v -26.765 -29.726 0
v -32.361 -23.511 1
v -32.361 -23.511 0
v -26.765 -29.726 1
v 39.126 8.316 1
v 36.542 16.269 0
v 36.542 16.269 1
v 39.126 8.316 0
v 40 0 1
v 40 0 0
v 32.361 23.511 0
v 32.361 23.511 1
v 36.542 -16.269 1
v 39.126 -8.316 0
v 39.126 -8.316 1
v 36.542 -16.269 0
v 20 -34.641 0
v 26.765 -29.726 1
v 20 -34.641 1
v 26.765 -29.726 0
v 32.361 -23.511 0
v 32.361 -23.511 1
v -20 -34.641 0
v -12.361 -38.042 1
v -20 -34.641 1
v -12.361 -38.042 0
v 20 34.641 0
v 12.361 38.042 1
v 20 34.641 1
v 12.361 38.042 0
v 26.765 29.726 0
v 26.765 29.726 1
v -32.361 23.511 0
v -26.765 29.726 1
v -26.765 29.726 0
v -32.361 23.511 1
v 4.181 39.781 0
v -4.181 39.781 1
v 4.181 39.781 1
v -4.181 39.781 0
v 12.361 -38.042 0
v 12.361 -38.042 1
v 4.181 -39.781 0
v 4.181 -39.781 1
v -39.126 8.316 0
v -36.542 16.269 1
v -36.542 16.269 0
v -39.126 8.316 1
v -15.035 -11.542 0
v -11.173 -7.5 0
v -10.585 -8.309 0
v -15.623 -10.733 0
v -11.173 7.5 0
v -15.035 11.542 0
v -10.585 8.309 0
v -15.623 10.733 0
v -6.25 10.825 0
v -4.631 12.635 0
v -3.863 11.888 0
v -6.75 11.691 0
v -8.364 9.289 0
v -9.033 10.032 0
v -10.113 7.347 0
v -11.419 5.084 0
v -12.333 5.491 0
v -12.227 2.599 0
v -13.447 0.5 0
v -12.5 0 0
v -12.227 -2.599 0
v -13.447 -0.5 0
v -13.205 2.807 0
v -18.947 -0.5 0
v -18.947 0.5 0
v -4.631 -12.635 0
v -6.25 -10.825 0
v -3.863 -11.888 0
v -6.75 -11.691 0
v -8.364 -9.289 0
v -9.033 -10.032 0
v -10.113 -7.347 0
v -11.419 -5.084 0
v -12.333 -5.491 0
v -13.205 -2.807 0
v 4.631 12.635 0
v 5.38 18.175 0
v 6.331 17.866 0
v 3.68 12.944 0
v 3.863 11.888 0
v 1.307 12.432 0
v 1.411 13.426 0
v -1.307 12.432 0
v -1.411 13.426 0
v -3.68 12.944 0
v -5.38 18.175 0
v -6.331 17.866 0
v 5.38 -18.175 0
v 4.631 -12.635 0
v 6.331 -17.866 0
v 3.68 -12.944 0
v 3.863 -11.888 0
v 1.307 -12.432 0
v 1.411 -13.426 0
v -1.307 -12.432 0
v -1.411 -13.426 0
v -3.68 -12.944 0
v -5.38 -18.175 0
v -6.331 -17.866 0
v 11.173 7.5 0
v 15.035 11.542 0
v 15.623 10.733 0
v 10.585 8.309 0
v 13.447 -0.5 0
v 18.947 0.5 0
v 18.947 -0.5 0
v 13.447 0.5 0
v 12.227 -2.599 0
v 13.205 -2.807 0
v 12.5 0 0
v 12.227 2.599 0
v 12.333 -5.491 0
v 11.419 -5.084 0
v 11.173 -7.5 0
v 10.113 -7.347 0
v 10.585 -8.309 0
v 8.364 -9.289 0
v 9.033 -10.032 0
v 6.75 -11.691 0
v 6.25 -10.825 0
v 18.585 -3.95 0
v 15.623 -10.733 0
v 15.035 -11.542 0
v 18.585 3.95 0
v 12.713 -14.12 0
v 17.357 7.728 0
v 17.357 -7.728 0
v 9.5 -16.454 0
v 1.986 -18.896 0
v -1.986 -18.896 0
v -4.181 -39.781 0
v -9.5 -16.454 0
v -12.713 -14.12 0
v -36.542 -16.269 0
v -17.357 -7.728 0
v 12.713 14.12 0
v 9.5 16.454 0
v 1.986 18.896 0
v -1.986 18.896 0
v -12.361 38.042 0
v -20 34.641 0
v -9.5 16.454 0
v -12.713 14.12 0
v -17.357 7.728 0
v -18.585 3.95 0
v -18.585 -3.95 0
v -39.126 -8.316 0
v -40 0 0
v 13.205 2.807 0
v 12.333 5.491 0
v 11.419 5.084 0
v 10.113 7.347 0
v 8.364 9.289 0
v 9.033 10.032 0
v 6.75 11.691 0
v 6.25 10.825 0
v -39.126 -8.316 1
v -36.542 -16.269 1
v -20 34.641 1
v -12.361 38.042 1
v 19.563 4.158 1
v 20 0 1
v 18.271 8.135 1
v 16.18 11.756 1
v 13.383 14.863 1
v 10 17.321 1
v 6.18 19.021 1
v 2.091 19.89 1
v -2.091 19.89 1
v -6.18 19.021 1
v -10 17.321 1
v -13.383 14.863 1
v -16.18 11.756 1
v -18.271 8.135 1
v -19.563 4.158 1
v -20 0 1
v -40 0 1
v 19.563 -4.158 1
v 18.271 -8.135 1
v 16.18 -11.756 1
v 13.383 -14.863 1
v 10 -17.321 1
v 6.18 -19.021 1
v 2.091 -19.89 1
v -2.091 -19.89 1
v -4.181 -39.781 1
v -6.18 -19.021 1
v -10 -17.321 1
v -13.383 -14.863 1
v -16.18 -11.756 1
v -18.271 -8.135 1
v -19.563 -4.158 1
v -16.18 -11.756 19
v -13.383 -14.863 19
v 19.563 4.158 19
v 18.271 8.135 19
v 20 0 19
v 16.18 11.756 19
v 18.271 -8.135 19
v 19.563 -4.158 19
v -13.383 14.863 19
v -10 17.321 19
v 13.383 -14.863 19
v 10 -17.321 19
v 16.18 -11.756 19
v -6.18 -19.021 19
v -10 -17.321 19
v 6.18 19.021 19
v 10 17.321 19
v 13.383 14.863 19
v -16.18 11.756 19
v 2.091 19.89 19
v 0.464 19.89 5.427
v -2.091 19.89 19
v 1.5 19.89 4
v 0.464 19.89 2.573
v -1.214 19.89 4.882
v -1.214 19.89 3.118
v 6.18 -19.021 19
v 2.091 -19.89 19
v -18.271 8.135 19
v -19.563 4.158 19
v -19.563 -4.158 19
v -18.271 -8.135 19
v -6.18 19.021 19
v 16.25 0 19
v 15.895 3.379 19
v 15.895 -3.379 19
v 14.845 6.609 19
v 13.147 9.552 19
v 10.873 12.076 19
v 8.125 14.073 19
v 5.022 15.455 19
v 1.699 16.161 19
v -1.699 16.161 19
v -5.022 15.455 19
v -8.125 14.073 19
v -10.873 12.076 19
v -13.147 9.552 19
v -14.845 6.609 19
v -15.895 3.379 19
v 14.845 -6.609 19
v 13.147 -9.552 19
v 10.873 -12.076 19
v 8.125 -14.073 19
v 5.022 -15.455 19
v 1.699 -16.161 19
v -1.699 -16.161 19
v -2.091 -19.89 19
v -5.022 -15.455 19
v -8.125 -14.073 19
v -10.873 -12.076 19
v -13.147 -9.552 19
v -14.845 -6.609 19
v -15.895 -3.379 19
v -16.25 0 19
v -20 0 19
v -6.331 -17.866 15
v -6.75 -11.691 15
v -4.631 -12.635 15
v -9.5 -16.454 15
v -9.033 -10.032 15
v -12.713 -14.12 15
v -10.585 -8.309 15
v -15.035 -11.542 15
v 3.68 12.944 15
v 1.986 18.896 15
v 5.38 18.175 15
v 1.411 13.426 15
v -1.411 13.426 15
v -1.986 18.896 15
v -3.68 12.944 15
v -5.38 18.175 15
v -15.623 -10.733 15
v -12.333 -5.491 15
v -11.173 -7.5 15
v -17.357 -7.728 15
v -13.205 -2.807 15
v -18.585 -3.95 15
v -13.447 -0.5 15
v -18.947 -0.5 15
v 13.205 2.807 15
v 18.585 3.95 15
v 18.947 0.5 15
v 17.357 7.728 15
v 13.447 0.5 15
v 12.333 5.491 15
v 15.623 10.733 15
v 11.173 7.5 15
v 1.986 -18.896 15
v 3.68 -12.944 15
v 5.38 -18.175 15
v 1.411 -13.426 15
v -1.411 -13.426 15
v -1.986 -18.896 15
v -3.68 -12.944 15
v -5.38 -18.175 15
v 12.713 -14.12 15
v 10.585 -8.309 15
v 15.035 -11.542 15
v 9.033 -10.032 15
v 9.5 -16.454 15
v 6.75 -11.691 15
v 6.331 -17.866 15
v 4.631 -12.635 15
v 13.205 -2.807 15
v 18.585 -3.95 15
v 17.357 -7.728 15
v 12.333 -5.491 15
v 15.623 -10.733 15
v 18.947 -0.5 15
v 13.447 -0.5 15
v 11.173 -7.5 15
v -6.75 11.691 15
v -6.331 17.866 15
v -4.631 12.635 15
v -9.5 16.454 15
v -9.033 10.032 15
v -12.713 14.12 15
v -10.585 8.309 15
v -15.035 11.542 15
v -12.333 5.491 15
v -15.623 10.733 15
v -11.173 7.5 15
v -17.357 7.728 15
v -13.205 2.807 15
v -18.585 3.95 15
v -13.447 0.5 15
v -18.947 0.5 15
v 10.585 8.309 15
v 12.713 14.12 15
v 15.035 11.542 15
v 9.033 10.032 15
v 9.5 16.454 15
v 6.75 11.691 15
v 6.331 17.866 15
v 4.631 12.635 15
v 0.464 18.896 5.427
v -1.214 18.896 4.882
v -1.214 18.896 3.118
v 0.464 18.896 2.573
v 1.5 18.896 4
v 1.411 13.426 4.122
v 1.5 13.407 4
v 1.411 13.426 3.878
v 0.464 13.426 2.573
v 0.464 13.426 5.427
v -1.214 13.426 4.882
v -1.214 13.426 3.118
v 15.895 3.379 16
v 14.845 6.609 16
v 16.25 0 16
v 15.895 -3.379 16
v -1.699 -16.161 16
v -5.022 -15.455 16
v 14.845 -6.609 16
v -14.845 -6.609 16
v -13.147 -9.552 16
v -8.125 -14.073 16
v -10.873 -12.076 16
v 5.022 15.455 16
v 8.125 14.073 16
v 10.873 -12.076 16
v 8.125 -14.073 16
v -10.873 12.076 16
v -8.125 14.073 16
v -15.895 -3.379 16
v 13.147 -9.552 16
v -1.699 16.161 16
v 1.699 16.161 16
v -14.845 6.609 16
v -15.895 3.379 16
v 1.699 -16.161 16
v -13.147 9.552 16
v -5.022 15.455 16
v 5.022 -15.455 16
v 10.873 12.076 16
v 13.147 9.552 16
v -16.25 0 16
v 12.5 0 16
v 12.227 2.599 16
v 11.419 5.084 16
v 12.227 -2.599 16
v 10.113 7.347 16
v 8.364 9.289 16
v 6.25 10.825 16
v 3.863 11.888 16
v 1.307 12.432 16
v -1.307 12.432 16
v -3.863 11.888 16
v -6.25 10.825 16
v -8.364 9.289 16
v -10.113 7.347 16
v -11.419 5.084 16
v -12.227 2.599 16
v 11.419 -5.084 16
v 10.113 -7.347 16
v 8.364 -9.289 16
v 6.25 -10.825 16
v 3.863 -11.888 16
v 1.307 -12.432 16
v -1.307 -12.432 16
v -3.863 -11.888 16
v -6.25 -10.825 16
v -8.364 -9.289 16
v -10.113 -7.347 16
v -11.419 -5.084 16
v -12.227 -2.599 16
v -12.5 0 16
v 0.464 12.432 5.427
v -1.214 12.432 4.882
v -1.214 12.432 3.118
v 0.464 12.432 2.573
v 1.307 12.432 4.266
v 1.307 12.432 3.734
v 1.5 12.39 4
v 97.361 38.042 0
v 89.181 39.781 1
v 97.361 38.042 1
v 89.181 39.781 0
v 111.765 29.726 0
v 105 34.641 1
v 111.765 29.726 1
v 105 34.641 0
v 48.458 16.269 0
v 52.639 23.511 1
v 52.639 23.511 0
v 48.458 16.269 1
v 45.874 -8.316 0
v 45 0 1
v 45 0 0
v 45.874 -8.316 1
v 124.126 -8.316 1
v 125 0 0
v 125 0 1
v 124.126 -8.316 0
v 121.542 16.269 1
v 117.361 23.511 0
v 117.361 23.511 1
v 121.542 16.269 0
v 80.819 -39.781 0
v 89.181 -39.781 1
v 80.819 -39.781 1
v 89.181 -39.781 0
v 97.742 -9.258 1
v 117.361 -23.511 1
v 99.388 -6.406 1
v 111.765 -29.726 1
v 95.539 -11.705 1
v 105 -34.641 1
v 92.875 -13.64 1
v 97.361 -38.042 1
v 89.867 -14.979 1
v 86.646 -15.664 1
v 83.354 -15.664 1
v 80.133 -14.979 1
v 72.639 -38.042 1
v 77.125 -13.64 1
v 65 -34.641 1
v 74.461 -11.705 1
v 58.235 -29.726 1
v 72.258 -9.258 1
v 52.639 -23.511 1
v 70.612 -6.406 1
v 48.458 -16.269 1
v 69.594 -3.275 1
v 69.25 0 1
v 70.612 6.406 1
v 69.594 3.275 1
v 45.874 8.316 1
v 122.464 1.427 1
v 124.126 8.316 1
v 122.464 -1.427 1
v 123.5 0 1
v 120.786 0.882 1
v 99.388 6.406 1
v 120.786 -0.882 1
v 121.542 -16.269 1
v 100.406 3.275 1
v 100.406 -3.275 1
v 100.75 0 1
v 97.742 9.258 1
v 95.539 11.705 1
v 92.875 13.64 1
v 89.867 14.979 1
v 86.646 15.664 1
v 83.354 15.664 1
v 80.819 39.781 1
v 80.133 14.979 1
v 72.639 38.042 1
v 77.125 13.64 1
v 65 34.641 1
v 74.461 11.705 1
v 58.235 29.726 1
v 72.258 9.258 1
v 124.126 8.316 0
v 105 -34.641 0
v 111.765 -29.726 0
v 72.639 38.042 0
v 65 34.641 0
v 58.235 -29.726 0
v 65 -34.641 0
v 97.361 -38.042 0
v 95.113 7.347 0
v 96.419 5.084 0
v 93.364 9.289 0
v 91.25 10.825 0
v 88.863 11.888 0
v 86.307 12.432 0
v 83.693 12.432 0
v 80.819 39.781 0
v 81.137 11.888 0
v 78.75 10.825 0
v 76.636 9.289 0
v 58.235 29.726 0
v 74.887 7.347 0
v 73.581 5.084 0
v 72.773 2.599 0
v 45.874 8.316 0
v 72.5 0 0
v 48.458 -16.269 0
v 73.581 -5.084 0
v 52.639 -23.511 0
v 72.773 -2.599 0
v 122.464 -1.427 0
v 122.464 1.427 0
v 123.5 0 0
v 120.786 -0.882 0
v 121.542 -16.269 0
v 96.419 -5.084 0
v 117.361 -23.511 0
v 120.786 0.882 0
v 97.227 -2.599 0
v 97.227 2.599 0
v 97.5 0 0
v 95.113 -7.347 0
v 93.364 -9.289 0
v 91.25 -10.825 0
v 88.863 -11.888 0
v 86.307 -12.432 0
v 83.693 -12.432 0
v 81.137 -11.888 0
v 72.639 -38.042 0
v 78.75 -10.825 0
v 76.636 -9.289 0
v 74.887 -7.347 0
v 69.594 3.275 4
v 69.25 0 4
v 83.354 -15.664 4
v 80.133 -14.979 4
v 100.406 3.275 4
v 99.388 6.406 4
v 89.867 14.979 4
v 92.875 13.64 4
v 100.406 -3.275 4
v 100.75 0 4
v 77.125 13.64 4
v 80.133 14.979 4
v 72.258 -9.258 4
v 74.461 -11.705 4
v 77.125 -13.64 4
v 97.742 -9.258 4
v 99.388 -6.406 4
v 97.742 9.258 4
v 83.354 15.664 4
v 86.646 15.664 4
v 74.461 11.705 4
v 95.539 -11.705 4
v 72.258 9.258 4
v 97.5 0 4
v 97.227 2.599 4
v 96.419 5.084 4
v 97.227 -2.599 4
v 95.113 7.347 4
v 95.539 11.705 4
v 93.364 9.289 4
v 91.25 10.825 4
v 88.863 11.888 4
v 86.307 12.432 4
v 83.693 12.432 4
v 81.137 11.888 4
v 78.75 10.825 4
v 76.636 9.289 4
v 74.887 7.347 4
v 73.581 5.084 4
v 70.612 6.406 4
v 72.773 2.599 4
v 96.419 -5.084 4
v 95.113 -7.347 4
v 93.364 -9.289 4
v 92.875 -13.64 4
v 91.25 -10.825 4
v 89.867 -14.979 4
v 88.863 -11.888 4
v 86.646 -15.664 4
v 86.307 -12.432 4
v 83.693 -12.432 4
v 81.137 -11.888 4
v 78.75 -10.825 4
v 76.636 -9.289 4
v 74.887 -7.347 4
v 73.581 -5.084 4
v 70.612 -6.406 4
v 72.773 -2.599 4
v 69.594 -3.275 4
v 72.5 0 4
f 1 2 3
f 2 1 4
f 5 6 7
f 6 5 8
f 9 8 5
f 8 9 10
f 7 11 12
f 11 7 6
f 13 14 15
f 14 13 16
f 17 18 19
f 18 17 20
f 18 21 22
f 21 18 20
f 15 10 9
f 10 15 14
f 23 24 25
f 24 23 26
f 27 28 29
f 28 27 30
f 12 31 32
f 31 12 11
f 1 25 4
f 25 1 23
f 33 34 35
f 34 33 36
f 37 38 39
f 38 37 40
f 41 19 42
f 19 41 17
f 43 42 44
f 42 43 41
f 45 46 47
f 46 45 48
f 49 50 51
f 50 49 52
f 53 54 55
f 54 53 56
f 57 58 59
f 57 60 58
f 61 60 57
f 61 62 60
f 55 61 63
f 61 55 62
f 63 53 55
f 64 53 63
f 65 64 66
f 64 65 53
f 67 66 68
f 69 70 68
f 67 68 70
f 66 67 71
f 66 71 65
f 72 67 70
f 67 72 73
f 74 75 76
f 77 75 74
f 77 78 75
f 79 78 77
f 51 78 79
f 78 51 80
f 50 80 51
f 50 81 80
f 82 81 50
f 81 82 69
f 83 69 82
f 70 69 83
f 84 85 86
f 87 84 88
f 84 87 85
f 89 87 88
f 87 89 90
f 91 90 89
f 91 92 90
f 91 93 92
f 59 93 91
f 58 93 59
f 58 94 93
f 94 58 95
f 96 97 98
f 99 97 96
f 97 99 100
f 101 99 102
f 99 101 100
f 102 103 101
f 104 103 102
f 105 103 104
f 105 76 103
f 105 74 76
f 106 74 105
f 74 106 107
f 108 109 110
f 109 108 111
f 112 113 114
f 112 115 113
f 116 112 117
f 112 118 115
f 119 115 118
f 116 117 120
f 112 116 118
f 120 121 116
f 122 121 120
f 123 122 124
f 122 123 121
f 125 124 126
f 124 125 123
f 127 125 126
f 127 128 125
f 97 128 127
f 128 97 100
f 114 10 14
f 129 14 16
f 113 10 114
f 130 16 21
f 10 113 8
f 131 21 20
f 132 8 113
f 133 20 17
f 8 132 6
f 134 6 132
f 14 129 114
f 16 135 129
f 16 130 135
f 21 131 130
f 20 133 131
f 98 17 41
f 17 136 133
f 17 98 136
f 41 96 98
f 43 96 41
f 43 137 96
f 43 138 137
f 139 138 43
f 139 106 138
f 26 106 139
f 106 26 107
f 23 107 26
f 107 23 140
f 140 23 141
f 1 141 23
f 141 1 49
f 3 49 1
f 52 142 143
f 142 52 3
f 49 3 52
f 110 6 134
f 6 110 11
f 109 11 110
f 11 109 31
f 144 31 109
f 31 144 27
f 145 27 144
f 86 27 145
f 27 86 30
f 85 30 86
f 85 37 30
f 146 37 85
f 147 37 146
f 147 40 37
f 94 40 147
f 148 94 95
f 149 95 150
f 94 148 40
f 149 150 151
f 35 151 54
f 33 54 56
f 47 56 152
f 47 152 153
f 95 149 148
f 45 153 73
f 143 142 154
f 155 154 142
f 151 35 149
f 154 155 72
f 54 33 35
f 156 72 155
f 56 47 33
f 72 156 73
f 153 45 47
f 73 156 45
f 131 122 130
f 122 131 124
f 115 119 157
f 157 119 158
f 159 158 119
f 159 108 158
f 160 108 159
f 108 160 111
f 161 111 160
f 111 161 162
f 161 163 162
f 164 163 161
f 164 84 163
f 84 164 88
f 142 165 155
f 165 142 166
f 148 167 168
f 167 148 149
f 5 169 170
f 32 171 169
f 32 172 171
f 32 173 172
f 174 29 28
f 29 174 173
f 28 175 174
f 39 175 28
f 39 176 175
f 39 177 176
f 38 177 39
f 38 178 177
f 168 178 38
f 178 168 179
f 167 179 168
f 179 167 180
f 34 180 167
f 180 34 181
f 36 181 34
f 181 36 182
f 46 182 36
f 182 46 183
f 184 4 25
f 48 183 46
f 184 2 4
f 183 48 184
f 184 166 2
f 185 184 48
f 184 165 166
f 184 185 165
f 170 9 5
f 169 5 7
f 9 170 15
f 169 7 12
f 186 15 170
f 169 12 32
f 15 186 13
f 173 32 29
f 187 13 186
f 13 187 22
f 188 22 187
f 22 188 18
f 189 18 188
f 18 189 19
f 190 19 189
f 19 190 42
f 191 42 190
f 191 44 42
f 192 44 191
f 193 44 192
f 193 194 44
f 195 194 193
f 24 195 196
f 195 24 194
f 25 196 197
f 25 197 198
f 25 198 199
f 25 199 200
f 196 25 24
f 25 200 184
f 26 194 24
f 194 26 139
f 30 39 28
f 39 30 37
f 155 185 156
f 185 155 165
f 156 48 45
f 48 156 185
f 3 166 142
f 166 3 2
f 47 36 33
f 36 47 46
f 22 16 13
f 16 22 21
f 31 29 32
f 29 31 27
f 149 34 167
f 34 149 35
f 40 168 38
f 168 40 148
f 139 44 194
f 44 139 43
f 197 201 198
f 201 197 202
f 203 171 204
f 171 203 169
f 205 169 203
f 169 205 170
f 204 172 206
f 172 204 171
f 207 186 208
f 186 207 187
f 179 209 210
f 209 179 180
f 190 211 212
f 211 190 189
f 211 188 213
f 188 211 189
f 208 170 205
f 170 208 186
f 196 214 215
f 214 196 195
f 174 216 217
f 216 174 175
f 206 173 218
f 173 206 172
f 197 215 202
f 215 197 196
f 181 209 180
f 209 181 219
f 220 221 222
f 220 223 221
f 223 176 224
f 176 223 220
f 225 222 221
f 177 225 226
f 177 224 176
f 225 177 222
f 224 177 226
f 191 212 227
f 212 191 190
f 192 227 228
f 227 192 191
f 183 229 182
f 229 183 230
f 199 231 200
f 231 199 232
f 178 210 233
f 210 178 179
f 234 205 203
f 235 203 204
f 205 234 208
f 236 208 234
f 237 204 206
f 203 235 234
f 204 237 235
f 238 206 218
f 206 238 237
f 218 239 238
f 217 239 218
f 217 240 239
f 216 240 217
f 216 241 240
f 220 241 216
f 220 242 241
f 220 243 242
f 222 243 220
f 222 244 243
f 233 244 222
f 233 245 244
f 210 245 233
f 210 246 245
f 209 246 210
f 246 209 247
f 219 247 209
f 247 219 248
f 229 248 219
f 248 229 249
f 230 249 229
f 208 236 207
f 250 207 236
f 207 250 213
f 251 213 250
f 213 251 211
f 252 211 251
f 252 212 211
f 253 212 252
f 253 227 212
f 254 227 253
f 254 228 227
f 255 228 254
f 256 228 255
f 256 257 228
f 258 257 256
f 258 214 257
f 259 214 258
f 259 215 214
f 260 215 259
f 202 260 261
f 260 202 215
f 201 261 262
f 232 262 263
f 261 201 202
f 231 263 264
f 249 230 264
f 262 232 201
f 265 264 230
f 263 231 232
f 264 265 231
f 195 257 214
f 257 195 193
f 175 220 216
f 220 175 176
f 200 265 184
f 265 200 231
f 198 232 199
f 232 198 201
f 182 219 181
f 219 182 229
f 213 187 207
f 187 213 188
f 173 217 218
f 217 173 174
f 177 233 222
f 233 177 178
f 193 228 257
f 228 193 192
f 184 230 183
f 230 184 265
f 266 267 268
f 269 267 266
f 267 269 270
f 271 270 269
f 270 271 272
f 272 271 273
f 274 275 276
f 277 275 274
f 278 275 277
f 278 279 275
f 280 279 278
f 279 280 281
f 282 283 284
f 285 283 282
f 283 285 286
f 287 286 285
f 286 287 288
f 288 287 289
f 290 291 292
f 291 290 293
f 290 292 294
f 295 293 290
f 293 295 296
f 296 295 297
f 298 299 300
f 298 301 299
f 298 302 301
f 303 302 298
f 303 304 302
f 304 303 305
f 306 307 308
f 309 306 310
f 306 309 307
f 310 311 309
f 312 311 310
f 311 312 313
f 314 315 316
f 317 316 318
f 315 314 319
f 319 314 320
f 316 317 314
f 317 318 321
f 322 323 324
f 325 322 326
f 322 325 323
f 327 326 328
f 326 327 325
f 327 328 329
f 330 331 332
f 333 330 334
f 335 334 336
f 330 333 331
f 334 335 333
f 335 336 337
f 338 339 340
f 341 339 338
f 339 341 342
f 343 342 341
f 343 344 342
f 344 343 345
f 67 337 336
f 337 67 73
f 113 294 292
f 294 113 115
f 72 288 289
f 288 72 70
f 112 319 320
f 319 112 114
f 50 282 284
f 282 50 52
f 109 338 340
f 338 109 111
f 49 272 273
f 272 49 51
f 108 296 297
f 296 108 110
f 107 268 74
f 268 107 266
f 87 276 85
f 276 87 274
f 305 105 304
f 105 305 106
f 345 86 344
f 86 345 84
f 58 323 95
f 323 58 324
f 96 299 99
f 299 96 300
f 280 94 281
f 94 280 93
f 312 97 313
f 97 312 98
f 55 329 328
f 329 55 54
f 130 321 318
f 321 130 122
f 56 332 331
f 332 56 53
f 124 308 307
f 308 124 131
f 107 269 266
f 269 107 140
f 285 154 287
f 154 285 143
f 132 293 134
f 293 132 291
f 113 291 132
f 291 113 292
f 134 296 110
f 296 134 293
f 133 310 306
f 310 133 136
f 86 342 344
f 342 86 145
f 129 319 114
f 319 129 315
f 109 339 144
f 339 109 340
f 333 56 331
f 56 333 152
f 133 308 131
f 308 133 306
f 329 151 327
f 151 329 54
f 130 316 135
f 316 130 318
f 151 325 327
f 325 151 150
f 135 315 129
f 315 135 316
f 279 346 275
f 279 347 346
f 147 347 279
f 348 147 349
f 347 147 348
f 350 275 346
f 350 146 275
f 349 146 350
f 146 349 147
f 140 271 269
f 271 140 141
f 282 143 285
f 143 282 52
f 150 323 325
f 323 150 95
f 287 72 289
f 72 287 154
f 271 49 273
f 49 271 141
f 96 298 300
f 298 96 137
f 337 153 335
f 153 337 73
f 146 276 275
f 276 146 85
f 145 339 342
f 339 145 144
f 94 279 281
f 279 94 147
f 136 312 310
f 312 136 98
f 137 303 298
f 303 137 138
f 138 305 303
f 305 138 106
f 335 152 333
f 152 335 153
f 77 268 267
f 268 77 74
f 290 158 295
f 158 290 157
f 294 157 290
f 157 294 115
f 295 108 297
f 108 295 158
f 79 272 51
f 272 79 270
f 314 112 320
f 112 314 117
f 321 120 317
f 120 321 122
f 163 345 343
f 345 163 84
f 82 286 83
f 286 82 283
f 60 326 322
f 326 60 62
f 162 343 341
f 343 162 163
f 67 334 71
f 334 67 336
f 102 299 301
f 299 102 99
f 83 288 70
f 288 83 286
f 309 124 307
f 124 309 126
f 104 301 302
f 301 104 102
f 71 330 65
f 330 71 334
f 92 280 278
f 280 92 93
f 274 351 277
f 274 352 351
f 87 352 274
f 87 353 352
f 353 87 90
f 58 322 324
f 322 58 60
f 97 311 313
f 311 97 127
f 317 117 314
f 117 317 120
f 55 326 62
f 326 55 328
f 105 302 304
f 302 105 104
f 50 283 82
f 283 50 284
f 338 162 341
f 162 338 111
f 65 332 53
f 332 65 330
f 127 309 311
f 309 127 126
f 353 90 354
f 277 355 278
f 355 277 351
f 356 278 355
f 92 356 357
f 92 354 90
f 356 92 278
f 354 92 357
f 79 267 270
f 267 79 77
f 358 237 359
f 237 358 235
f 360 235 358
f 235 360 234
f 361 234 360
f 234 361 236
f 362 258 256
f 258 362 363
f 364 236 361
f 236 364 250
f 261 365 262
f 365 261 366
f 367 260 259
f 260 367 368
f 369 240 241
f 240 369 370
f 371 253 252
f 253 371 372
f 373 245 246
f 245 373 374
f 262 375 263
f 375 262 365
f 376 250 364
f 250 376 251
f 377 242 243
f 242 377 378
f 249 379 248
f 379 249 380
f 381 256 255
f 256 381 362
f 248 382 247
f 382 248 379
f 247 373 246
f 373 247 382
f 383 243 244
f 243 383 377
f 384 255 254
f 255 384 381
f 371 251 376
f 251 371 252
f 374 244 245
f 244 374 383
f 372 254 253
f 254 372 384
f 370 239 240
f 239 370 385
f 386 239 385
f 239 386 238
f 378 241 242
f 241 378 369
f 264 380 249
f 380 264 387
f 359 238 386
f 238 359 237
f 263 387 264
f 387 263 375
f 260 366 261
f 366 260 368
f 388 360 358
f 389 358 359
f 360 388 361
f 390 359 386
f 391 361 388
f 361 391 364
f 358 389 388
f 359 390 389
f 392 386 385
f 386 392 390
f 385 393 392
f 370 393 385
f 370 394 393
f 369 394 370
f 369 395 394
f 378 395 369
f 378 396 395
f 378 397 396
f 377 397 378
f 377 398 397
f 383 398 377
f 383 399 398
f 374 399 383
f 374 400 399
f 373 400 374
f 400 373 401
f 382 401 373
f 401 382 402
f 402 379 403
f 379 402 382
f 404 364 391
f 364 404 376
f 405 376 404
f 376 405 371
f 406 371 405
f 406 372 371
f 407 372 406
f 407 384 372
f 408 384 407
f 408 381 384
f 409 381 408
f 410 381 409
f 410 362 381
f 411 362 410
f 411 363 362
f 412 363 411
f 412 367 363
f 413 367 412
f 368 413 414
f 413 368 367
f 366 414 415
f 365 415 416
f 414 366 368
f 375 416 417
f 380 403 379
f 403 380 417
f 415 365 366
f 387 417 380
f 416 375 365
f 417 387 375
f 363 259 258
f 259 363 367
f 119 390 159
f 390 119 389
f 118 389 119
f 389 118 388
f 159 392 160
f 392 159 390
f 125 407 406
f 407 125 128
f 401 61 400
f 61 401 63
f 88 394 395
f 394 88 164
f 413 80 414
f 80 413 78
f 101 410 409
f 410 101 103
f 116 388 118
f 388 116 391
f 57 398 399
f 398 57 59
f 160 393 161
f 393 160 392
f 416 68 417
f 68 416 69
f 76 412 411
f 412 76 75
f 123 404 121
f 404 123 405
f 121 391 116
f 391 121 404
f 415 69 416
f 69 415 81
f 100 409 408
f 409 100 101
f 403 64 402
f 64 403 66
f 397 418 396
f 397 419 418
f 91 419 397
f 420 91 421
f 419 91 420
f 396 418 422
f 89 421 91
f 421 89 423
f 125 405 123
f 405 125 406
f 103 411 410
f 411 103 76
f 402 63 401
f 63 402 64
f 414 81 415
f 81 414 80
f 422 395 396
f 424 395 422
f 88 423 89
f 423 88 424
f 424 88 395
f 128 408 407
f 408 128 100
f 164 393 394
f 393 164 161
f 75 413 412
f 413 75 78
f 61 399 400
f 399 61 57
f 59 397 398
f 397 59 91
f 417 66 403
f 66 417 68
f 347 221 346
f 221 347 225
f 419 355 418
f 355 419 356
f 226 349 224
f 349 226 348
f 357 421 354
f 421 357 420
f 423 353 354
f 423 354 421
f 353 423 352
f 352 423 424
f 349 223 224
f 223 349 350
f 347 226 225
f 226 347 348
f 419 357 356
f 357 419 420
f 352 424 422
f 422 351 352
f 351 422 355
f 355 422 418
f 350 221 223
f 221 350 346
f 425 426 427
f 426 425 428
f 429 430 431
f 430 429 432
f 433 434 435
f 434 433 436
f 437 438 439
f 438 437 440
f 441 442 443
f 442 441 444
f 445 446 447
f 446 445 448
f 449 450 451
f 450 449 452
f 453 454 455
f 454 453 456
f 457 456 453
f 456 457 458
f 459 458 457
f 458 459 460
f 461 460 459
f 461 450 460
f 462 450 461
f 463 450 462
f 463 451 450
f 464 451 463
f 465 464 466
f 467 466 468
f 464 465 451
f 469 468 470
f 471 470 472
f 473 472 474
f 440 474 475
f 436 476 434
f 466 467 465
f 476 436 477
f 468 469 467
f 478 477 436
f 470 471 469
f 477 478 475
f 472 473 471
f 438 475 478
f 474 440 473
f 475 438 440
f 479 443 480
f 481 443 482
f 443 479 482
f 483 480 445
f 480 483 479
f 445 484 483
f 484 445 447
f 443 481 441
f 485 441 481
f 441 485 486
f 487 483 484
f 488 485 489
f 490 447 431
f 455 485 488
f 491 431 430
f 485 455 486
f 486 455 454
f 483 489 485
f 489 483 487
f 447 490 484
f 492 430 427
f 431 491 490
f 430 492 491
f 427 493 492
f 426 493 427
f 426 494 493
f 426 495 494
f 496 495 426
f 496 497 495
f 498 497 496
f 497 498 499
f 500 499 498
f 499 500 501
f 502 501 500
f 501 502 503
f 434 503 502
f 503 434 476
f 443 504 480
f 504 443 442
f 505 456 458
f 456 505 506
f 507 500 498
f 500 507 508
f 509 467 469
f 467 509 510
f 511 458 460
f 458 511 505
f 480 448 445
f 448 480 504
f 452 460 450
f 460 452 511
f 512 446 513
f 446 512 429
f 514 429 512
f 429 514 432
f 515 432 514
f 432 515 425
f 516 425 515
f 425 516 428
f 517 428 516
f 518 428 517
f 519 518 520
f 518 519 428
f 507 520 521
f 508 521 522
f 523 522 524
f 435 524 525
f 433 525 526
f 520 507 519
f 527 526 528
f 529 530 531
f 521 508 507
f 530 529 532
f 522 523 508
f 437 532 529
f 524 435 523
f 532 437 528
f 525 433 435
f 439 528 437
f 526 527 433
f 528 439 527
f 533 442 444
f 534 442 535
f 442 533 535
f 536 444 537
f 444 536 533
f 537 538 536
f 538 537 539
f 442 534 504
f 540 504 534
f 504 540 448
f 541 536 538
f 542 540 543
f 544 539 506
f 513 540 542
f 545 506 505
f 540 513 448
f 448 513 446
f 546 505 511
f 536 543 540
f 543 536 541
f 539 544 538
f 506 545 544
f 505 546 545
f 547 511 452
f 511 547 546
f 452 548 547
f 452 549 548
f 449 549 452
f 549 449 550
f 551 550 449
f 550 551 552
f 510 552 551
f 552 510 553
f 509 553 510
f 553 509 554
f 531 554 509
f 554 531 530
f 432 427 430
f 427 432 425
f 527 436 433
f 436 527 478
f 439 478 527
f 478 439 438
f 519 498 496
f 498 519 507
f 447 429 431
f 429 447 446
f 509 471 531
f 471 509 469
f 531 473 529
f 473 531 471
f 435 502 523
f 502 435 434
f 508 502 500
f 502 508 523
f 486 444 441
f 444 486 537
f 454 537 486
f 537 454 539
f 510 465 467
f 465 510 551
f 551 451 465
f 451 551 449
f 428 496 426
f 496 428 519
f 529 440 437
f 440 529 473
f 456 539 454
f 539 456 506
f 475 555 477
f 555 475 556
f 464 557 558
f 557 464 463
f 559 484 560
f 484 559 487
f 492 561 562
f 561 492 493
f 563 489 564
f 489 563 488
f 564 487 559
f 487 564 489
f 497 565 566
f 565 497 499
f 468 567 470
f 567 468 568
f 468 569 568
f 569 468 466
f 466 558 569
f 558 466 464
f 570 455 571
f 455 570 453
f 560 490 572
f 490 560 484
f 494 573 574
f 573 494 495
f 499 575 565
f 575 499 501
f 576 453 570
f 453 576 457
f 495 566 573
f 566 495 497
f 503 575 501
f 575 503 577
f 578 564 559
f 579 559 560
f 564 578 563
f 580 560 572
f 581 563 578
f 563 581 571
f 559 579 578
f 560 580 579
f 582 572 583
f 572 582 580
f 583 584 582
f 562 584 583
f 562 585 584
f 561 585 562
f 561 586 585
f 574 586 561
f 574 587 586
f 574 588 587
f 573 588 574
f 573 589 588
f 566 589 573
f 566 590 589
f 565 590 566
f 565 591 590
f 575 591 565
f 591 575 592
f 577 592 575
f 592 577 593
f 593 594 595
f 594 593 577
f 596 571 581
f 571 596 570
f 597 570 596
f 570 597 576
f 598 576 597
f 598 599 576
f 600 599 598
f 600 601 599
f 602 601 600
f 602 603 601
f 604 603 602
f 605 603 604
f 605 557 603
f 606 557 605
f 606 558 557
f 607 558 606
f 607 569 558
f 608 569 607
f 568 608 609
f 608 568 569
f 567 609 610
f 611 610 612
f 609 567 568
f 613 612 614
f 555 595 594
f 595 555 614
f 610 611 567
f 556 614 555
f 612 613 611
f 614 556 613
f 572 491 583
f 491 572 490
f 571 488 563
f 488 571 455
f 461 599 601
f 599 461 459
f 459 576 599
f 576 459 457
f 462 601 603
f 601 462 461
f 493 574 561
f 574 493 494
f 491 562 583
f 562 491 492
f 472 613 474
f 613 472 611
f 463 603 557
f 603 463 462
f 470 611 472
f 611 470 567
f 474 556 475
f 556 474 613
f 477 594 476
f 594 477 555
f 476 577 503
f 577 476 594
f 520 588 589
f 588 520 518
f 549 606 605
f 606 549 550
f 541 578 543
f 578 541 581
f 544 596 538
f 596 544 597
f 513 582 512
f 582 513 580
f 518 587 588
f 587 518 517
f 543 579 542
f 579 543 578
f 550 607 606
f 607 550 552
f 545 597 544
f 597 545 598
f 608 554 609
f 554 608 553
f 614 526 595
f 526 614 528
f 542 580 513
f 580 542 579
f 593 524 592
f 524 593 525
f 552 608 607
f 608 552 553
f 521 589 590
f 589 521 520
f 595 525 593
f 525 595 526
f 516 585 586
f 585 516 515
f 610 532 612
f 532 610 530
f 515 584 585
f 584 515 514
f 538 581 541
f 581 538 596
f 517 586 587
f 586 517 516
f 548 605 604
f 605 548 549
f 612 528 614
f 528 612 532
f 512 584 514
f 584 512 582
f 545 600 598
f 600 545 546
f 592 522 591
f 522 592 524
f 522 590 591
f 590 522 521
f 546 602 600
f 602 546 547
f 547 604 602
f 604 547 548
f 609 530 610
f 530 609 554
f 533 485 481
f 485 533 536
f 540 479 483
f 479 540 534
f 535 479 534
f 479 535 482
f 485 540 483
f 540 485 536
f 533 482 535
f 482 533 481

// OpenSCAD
// Created by G. Robinson 21/09/2016
// Licence: creative commons - attribution

/* [Part Selection] */

// Select the part to generate
part = "all"; // [A:Part A,B:Part B,all:All]

/* [Spool Dimensions] */

// Diameter of the spool flanges, mm
flange_outer_diameter = 80; //mm
// Diameter of the core around which the cable is wrapped, mm
hub_outer_diameter = 40; //mm
// Diameter of the hole through the center of the spool hub, mm
hub_inner_diameter = 25; //mm
// Overall width of the spool (outside), mm
spool_width = 20; //mm
// Flange cutouts save material, maybe not time!
use_flange_cutouts = 0; //[0:No,1:Yes]

/* [Advanced Parameters] */

// Diameter of the cable hole in both flange and hub, mm
cable_hole_diameter = 3;
// Thickness of the flanges, mm
flange_thickness = 1;
// Thickness of the hub and web structures, mm
structure_thickness = 1;
// Depth of the locating socket in the B part, mm
socket_depth = 3;
// Radial clearance allowed between the locating boss and socket, mm
socket_clearance = 0.5; //mm on radius
// Number of webs to use in hub and flange
web_count = 5; //[3:2:15]
// Web thickness for flange, mm
flange_web_thickness = 5;

/* [Hidden] */

socketod = (hub_inner_diameter + hub_outer_diameter)/2*1;
recessdepth = spool_width-flange_thickness-socket_depth-structure_thickness;

if (part == "A")
{
    partA();
}
else if (part == "B")
{
    partB();
}
else if (part == "all")
{
    partA();
    translate([flange_outer_diameter+5,0,0]) { 
        partB(); 
    }
}

// geometry - hub half
module partA() {
difference() {
    union() {
        cylinder(flange_thickness, flange_outer_diameter/2, flange_outer_diameter/2, false);
        cylinder(spool_width - flange_thickness, hub_outer_diameter/2, hub_outer_diameter/2, false);
    }
    translate([0,0,spool_width-flange_thickness-socket_depth]) {
        cylinder(socket_depth, socketod/2, socketod/2, false);
    }
    cylinder(spool_width, hub_inner_diameter/2, hub_inner_diameter/2, false);
    translate([0,0,flange_thickness+(cable_hole_diameter*1)]) {
        rotate([-90,0,0]) { 
            cylinder(flange_outer_diameter,cable_hole_diameter/2,cable_hole_diameter/2,false);
        }
    }
    if ((hub_outer_diameter-hub_inner_diameter)/2-structure_thickness*2>=max(cable_hole_diameter,3))
    {
        difference() {
            cylinder(recessdepth,hub_outer_diameter/2-structure_thickness, hub_outer_diameter/2-structure_thickness,false);
            cylinder(recessdepth,hub_inner_diameter/2+structure_thickness, hub_inner_diameter/2+structure_thickness,false);
            for (i=[0:web_count-1]) {
                rotate([0,0,180/web_count*i]) {
                    cube([flange_outer_diameter,structure_thickness,recessdepth*2],true);
                }
            }
        }
    }
    if (use_flange_cutouts == 1)
    {
        flangeCutoutSolid();  
    }
}
}

// geometry - face half
module partB() {
    difference() {
        union() {
            cylinder(flange_thickness, flange_outer_diameter/2, flange_outer_diameter/2, false);
            cylinder(socket_depth+flange_thickness, socketod/2-socket_clearance, socketod/2-socket_clearance, false);
        }
        cylinder(spool_width, hub_inner_diameter/2, hub_inner_diameter/2, false);
        translate([flange_outer_diameter/2-(cable_hole_diameter*1),0,0]) {
            cylinder(flange_thickness,cable_hole_diameter/2,cable_hole_diameter/2,false);
        }
        if (use_flange_cutouts == 1)
        {
            flangeCutoutSolid();   
        }
    }
}

module flangeCutoutSolid() {
    difference() {
        cylinder(flange_thickness,flange_outer_diameter/2-flange_web_thickness, flange_outer_diameter/2-flange_web_thickness,false);
        cylinder(flange_thickness,hub_outer_diameter/2+flange_web_thickness, hub_outer_diameter/2+flange_web_thickness,false);
        for (i=[0:web_count-1]) {
            rotate([0,0,180/web_count*i]) {
                cube([flange_outer_diameter,flange_web_thickness,flange_thickness*2],true);
            }
        }    
    }
}
